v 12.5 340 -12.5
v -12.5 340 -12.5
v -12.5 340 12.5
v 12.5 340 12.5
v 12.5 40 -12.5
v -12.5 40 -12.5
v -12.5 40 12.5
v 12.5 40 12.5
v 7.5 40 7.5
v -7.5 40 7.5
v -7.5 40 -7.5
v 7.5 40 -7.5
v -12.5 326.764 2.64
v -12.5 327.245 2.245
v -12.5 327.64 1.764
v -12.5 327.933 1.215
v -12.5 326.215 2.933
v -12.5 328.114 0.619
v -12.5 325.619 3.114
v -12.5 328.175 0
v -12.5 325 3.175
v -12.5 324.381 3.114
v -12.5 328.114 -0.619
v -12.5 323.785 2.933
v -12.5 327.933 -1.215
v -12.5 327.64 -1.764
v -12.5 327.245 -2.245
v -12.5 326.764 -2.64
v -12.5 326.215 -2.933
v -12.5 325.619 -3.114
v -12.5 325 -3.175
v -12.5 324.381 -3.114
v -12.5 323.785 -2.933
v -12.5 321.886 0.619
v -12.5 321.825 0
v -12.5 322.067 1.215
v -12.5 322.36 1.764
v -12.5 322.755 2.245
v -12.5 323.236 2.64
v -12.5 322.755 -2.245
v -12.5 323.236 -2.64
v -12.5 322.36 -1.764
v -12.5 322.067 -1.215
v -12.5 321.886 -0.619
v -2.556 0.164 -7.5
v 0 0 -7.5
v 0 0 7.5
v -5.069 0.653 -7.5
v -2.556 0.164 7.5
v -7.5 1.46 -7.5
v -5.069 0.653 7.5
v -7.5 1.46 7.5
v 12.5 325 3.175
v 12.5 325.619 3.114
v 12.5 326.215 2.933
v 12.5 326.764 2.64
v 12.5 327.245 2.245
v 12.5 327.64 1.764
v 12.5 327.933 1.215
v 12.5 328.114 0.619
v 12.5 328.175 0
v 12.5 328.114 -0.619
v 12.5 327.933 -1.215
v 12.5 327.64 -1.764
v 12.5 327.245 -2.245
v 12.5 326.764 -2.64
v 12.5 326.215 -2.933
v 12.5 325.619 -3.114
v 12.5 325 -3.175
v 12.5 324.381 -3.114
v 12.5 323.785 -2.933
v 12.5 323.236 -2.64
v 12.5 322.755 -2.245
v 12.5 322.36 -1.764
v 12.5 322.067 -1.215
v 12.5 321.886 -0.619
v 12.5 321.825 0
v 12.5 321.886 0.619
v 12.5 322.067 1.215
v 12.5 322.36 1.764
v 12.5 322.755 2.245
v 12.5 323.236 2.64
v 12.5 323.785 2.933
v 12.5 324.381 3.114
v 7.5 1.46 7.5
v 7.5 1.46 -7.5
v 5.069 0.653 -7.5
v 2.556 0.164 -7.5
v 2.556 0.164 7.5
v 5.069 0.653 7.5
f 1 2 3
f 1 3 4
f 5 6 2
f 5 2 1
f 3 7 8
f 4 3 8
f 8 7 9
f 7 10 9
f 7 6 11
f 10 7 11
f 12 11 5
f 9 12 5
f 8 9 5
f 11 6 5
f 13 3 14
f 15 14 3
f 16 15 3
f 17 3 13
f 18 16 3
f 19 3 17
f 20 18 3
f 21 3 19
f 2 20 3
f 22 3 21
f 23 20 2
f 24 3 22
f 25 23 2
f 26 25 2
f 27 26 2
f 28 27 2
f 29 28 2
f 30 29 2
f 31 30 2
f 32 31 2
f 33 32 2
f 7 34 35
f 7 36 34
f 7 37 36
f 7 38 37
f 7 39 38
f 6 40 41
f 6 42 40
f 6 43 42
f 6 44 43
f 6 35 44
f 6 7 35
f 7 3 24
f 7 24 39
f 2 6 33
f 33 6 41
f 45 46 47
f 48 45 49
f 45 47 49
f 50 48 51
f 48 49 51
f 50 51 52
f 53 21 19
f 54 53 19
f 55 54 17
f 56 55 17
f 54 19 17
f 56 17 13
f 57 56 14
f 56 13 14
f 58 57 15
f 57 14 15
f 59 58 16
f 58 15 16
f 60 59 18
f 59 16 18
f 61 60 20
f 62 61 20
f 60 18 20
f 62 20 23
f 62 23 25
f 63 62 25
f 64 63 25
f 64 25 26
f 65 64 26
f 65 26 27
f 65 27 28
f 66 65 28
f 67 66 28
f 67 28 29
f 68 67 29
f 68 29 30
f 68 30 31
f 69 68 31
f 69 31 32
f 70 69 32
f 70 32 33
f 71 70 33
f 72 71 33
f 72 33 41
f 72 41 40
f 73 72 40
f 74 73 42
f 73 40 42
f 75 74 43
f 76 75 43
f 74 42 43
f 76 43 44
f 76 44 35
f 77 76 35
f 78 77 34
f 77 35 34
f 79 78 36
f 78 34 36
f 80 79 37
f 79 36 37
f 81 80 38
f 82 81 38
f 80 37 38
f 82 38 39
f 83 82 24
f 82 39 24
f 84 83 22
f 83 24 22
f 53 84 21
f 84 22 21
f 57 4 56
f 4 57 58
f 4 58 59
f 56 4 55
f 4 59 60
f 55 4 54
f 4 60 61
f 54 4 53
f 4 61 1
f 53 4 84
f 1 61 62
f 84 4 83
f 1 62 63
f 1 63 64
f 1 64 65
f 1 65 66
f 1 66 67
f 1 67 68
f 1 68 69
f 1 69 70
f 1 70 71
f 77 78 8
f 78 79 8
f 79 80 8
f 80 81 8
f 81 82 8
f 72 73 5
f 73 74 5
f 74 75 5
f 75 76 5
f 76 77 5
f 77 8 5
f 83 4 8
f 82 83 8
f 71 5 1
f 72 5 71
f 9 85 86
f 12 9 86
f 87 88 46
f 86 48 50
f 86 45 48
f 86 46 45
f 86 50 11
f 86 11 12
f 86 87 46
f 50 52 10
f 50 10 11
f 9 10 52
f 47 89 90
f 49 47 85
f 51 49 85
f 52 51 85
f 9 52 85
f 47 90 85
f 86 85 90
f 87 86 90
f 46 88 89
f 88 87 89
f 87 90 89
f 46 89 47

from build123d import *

# Parameters (mm, degrees)
SKETCH1_W                   = 15
SKETCH1_H                   = 15
BOSS_EXTRUDE1_DEPTH         = 40
CUT_EXTRUDE1_DEPTH          = 44.373378932
SKETCH3_W                   = 25
SKETCH3_H                   = 25
BOSS_EXTRUDE2_DEPTH         = 300
F_1_4_0_25_DIAMETER_HOLE1_D = 6.35


with BuildPart() as part:
    # Sketch1 → Boss-Extrude1 (new body)
    with BuildSketch(Plane(origin=(0, 0, 0), x_dir=(1, 0, 0), z_dir=(0, 1, 0))):
        Rectangle(SKETCH1_W, SKETCH1_H)
    extrude(amount=BOSS_EXTRUDE1_DEPTH)

    # Sketch2 → Cut-Extrude1 (cut, through all)
    with BuildSketch(Plane.XY.offset(7.5)):
        with BuildLine():
            ThreePointArc((1.6e-07, 0), (-3.820345171, 0.368266435), (-7.5, 1.459503782))
            Line((-7.5, 1.459503782), (-7.5, 0))
            Line((-7.5, 0), (1.6e-07, 0))
        make_face()
        with BuildLine():
            ThreePointArc((7.5, 1.459503782), (3.820345328, 0.368266465), (1.6e-07, 0))
            Line((1.6e-07, 0), (7.5, 0))
            Line((7.5, 0), (7.5, 1.459503782))
        make_face()
    extrude(amount=-CUT_EXTRUDE1_DEPTH, mode=Mode.SUBTRACT)

    # Sketch3 → Boss-Extrude2 (add)
    with BuildSketch(Plane(origin=(0, 40, 0), x_dir=(1, 0, 0), z_dir=(0, 1, 0))):
        Rectangle(SKETCH3_W, SKETCH3_H)
    extrude(amount=BOSS_EXTRUDE2_DEPTH)

    # 1/4 (0.25) Diameter Hole1 (through all)
    with Locations(Plane(origin=(12.5, 0, 0), x_dir=(0, 0, -1), z_dir=(1, 0, 0))):
        with Locations((0, 325)):
            Hole(F_1_4_0_25_DIAMETER_HOLE1_D / 2)


solid = part.part
